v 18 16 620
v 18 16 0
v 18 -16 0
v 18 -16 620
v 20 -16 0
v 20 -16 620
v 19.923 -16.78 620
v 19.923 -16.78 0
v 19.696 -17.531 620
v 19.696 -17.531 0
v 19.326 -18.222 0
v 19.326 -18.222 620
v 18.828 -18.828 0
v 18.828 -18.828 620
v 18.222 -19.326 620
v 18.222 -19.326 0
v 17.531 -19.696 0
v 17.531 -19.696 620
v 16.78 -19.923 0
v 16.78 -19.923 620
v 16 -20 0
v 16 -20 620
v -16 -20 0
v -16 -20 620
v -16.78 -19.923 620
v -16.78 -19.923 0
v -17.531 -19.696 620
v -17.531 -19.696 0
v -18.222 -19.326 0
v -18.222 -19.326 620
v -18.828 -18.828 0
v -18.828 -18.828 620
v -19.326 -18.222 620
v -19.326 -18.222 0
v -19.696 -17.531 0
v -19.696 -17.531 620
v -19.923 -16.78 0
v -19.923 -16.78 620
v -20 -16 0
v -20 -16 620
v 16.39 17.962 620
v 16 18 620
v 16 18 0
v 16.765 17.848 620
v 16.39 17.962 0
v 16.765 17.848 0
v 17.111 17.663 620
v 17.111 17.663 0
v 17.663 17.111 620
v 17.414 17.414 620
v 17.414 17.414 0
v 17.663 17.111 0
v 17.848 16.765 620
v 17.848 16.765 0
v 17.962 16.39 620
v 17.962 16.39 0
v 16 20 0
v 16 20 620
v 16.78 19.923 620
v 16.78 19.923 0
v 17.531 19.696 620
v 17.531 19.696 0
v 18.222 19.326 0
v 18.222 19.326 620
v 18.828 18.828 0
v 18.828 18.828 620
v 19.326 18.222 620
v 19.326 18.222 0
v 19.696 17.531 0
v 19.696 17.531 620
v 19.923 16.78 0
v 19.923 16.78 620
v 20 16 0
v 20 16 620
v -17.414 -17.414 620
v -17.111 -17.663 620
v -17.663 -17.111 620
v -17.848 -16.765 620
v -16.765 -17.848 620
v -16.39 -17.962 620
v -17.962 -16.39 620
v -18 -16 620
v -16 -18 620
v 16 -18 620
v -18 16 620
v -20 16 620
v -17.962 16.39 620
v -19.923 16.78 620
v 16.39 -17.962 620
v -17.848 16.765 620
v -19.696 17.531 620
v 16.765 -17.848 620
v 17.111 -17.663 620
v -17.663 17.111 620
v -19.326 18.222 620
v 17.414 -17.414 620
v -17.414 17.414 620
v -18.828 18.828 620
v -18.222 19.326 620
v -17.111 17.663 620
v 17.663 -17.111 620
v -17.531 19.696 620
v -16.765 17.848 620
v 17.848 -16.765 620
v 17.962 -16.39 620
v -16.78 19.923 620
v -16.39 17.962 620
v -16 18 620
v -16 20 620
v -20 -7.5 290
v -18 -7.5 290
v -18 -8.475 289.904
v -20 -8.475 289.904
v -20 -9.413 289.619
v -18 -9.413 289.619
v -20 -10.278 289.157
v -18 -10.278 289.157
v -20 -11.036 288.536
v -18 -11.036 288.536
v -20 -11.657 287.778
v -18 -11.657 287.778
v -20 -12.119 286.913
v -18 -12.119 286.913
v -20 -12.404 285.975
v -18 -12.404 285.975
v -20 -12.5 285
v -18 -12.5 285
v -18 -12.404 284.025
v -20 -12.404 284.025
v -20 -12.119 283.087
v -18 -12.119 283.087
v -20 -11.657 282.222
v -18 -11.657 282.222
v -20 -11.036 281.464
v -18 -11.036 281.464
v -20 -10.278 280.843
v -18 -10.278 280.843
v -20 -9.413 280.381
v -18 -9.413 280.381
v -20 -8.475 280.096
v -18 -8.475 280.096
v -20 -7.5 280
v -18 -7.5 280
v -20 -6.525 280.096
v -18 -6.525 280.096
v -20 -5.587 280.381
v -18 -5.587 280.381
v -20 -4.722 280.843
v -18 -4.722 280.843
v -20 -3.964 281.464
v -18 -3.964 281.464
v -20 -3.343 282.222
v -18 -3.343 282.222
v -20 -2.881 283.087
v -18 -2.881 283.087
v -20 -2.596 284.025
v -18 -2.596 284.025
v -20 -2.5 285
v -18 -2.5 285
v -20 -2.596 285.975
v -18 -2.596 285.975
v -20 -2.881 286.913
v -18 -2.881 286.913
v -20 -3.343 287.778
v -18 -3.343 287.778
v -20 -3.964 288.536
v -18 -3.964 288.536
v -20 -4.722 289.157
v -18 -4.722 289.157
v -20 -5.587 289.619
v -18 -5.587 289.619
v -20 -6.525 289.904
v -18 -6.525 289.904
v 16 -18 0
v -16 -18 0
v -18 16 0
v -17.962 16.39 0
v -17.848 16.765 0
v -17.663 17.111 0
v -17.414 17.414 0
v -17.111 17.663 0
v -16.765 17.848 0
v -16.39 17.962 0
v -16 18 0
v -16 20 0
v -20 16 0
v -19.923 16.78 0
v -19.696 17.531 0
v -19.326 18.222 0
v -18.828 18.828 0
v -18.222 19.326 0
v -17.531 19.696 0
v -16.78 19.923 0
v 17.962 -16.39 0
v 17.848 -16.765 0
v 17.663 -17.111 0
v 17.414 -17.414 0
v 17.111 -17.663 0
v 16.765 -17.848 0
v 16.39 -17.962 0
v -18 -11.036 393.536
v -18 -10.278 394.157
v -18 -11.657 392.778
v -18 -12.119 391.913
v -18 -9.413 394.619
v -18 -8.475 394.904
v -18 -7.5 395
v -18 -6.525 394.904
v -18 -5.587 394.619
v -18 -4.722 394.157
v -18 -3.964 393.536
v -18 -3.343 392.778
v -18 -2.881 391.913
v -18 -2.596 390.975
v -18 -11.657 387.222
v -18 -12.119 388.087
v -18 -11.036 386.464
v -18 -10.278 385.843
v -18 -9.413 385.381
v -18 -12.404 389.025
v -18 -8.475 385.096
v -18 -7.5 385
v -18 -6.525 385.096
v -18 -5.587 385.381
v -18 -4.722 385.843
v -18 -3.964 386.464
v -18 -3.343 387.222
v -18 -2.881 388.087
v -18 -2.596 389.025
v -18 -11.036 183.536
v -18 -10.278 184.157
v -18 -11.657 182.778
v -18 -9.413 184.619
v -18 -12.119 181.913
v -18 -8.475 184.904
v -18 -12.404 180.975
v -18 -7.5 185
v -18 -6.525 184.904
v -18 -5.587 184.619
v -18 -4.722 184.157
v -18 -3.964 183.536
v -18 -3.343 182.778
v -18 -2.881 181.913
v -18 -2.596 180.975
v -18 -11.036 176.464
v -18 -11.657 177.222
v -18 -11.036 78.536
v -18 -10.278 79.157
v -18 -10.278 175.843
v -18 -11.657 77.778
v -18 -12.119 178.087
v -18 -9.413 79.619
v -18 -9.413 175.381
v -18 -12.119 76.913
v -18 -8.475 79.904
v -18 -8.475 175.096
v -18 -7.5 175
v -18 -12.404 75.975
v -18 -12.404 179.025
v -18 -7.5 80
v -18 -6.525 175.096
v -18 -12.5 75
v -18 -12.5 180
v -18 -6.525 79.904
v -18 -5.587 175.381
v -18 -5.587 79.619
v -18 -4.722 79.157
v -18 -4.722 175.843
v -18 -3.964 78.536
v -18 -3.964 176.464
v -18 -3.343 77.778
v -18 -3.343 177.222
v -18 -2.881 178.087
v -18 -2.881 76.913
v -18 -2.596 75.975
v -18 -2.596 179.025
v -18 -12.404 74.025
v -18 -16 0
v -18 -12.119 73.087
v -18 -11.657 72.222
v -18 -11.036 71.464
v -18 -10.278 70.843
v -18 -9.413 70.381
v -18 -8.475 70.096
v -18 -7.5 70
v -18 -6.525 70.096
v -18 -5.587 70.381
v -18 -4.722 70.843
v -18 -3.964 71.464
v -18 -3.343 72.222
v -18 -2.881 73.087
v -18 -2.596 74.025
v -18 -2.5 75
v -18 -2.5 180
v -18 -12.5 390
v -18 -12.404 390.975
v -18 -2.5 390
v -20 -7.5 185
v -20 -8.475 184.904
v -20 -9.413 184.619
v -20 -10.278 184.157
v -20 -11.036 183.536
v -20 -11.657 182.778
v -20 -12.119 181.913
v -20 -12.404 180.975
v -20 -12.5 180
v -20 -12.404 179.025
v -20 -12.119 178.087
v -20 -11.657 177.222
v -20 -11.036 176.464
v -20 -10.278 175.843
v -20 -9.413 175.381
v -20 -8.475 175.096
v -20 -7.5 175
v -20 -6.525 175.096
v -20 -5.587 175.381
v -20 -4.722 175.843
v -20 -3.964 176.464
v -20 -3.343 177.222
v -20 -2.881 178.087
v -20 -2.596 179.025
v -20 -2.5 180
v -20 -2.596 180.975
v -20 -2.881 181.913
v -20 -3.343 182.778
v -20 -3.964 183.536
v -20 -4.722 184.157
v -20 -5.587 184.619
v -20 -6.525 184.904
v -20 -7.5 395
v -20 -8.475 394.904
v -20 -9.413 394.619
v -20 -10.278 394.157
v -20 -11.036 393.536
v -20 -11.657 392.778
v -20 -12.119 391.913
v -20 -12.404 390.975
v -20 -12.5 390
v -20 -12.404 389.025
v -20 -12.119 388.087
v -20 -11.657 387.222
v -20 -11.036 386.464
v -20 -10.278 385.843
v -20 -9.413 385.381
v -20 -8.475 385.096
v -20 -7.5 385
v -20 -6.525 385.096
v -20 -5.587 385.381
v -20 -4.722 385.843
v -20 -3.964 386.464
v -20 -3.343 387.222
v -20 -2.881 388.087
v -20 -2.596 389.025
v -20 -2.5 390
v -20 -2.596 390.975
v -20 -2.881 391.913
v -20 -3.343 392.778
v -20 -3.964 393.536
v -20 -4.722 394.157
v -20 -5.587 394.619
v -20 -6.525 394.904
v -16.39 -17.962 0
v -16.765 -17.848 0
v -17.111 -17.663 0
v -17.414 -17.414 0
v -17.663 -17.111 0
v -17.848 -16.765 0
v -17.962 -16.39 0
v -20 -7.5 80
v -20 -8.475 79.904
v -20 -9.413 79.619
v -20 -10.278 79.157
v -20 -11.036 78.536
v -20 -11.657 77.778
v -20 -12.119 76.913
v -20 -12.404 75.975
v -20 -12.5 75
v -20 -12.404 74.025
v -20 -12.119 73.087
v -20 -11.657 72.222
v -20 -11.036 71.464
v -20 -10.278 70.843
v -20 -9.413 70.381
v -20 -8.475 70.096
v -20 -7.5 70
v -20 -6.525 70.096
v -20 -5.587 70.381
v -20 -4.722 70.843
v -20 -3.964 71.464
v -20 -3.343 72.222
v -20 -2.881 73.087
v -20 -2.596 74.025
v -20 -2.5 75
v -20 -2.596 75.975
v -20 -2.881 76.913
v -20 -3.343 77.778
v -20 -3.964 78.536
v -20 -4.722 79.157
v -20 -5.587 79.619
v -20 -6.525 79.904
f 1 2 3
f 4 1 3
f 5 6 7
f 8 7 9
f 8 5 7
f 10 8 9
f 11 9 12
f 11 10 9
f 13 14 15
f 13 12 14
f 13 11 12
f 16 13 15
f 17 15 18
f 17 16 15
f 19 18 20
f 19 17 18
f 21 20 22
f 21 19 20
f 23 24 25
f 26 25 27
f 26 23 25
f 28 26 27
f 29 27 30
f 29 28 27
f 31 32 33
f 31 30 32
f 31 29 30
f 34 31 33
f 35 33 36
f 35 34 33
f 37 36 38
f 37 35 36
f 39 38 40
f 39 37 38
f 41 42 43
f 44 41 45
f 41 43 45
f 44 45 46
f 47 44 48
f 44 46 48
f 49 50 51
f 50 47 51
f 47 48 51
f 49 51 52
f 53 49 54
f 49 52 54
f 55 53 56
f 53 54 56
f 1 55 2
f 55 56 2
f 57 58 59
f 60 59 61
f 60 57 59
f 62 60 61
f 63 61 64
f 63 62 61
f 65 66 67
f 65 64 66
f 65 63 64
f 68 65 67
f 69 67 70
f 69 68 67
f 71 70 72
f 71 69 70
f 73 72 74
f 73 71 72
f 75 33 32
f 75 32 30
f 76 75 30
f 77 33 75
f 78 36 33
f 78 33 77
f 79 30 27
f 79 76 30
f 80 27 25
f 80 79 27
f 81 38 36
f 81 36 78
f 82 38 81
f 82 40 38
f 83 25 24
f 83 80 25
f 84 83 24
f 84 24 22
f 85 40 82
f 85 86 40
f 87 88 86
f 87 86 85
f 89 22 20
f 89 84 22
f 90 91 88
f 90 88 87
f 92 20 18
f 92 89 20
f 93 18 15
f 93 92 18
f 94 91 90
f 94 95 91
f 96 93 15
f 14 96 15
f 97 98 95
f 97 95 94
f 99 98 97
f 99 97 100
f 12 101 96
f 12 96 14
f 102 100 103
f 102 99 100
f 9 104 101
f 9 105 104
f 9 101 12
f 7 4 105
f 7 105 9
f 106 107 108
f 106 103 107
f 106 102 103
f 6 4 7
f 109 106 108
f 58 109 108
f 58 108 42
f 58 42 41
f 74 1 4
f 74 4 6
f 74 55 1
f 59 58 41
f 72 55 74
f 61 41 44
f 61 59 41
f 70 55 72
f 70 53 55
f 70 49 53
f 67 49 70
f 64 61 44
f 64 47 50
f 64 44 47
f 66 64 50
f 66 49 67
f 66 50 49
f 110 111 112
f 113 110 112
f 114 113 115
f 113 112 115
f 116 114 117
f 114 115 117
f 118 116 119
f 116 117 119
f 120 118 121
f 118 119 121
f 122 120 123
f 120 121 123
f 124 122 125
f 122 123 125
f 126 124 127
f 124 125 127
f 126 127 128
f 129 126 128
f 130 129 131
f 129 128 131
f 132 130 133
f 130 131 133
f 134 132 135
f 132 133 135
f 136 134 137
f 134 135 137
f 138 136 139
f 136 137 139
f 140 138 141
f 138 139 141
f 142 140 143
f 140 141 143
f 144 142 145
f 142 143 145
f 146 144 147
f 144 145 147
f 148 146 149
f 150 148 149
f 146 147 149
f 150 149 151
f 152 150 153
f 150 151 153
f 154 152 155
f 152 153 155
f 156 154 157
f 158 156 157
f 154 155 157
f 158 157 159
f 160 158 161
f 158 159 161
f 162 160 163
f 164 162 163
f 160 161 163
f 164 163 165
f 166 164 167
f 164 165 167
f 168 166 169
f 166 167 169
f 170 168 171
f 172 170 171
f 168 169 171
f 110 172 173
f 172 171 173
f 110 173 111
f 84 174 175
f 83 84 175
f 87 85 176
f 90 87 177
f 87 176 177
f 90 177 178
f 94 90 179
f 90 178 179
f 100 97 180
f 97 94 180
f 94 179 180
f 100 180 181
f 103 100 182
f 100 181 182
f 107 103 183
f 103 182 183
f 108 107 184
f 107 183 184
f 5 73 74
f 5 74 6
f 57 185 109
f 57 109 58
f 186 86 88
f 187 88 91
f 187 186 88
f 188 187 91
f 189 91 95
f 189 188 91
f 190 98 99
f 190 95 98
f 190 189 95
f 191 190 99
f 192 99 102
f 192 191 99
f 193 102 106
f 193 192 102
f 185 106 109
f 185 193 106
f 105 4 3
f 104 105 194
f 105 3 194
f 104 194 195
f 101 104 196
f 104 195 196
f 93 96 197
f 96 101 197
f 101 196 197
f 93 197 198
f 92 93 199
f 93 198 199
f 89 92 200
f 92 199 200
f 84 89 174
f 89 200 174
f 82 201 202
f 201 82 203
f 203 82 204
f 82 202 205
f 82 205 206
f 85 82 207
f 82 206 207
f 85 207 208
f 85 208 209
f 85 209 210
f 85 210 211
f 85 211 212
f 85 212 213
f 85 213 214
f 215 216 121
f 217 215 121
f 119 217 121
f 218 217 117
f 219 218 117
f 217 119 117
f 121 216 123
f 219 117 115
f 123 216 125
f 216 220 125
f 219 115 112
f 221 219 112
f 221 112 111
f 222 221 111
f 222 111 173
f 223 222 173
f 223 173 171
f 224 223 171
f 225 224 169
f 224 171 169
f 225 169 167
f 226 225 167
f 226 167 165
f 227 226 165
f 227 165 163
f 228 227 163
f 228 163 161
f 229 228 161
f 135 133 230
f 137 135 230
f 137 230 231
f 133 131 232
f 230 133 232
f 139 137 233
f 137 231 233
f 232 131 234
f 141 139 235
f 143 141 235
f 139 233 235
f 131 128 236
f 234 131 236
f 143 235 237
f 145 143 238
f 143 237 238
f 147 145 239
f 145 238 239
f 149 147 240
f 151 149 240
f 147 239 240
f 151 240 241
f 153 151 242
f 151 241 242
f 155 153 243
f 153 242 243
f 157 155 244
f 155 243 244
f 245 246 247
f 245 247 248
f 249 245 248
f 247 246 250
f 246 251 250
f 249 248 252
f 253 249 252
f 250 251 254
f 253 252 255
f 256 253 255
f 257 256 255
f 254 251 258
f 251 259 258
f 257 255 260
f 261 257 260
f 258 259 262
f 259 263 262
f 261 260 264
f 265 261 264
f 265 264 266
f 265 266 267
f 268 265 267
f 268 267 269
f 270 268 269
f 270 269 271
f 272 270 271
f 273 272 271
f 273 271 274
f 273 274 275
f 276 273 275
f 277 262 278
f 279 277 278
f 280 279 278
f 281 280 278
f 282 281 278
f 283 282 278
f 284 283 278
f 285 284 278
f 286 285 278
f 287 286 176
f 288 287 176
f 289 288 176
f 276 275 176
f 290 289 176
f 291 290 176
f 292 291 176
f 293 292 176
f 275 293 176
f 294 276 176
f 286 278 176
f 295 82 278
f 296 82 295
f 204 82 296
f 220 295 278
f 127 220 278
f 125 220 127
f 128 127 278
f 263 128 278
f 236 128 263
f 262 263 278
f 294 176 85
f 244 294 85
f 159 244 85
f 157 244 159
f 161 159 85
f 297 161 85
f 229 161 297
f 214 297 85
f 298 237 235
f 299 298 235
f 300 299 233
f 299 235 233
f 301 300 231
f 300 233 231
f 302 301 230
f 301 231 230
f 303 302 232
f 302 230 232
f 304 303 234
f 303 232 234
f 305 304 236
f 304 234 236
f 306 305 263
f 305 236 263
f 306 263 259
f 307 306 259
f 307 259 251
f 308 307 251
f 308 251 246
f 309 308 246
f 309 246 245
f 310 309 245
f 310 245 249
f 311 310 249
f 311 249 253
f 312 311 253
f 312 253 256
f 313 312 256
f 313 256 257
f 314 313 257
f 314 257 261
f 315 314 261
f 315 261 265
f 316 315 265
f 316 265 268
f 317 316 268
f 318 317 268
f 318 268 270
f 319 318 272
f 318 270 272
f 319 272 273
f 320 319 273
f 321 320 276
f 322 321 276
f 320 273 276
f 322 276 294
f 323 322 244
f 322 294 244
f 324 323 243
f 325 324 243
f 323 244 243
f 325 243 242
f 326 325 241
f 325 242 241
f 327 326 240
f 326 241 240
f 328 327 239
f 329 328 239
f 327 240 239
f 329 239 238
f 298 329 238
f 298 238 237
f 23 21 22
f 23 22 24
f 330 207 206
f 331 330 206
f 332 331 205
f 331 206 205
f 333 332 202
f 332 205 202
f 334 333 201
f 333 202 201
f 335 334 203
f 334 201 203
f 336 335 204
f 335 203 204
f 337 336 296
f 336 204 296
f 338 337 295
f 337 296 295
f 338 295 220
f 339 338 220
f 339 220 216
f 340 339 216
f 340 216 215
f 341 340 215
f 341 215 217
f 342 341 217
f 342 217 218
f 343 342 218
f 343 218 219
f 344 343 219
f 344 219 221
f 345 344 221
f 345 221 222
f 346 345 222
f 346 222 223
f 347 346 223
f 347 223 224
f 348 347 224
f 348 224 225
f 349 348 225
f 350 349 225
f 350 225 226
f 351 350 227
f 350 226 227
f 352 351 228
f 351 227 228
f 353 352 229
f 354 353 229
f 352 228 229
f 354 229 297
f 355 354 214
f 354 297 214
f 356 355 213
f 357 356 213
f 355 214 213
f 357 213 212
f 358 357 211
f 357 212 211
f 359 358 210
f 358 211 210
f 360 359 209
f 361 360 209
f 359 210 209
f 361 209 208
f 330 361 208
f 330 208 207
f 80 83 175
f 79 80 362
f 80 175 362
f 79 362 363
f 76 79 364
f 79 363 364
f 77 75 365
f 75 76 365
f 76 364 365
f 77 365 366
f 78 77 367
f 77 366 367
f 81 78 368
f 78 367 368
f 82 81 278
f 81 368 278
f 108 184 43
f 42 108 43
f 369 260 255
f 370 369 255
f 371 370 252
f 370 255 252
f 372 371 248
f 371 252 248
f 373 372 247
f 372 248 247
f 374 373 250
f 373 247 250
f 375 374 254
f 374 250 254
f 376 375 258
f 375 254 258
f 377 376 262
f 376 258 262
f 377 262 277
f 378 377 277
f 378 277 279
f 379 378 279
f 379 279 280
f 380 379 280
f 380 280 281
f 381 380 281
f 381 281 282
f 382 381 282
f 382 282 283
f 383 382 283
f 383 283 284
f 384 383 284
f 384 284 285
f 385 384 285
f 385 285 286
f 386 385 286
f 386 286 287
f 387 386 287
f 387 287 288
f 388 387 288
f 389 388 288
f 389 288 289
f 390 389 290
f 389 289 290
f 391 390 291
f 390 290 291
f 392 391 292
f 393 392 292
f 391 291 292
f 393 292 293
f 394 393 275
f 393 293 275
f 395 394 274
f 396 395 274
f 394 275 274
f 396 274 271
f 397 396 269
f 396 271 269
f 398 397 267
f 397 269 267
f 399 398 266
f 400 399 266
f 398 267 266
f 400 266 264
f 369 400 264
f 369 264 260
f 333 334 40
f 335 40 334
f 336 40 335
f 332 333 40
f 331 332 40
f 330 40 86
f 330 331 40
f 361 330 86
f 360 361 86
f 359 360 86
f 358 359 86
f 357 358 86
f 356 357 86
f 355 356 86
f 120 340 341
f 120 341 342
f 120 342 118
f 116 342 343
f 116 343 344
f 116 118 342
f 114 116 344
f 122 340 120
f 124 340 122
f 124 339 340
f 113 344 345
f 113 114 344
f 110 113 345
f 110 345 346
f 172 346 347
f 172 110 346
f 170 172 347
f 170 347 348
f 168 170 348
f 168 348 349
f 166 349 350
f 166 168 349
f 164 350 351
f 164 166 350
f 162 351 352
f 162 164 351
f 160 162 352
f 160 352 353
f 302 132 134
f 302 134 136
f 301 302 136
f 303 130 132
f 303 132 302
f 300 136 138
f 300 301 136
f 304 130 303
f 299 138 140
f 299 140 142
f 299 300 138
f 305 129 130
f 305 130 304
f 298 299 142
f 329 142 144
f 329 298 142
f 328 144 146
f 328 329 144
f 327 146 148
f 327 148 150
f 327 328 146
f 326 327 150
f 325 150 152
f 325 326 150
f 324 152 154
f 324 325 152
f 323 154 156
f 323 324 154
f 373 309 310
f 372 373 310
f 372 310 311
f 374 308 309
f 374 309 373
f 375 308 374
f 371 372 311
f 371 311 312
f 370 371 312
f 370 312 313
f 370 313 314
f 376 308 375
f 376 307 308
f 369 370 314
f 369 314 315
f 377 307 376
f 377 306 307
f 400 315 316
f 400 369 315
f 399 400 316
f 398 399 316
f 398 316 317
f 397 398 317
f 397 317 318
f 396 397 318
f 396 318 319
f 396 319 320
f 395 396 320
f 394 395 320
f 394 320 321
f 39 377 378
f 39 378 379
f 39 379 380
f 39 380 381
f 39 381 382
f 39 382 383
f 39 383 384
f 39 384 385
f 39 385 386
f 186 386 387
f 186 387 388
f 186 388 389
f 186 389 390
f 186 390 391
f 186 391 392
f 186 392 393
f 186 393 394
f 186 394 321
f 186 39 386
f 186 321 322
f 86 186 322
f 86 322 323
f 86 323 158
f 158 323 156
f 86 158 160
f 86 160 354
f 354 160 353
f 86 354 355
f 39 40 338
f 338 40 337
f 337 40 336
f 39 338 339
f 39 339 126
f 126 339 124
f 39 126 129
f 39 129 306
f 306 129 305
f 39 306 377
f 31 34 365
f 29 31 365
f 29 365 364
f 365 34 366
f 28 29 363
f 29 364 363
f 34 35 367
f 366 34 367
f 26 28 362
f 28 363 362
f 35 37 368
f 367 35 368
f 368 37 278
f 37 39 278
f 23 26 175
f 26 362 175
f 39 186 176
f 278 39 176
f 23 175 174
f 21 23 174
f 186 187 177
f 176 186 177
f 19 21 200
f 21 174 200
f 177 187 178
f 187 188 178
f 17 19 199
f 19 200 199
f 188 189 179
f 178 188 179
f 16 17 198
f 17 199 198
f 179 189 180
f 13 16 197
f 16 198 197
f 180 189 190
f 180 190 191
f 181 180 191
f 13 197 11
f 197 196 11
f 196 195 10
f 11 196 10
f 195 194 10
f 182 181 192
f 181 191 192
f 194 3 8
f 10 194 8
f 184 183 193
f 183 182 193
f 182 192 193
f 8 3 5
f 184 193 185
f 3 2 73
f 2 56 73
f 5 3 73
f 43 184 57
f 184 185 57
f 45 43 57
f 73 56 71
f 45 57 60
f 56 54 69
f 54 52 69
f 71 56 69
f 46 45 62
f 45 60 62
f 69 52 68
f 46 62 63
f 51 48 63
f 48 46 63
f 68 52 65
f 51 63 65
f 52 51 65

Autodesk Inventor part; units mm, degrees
ref_plane "YZ Plane" through (0, 0, 0) normal (1, 0, 0) x (0, 1, 0)
ref_plane "Piano iniziale" through (0, 0, 0) normal (0, 0, 1) x (1, 0, 0)
ref_plane "Piano finale" through (0, 0, 620) normal (0, 0, 1) x (1, 0, 0)
sketch "Schizzo" plane through (0, 0, 0) normal (0, 0, 1) x (1, 0, 0)
  line L0 (-20, -16) -> (-20, 16)
  line L1 (-16, 20) -> (16, 20)
  line L2 (20, 16) -> (20, -16)
  line L3 (16, -20) -> (-16, -20)
  arc A0 (-20, -16) -> (-16, -20) centre (-16, -16) ccw
  arc A1 (20, 16) -> (16, 20) centre (16, 16) ccw
  arc A2 (-16, 20) -> (-20, 16) centre (-16, 16) ccw
  arc A3 (16, -20) -> (20, -16) centre (16, -16) ccw
  arc A4 (-16, 18) -> (-18, 16) centre (-16, 16) ccw
  line L4 (-16, 18) -> (16, 18)
  arc A5 (18, 16) -> (16, 18) centre (16, 16) ccw
  line L5 (18, 16) -> (18, -16)
  arc A6 (16, -18) -> (18, -16) centre (16, -16) ccw
  line L6 (16, -18) -> (-16, -18)
  arc A7 (-18, -16) -> (-16, -18) centre (-16, -16) ccw
  line L7 (-18, -16) -> (-18, 16)
  line L8 (0, 29.1598) -> (0, -29.1598) construction
  line L9 (-29.1598, 0) -> (29.1598, 0) construction
  dimension "d7" = 4
  dimension "d9" = 40
  dimension "d11" = 40
  dimension "d12" = 2
  dimension "d15" = 20
  dimension "d16" = 20
extrude "Corpo" add sketch "Schizzo" along normal up to surface (620 mm away) from surface at 0
sketch "Sketch3" plane through (0, 0, 0) normal (0, 0, 1) x (1, 0, 0)
  line L0 (0, 0) -> (10, 0)
ref_plane "Work Plane3" through (0, 0, 0) normal (0, -1, 0) x (1, 0, 0)
sketch "Sketch4" plane through (0, 0, 0) normal (0, -1, 0) x (1, 0, 0)
  line L0 (-2, 0) -> (12, 0)
  line L1 (-2, 620) -> (12, 620)
  dimension "d18" = 620
sketch "Schizzo5" plane through (-20, 16, 0) normal (-1, 0, 0) x (0, 0, 1)
  line L0 (0, -36) -> (620, -36) projected
  line L1 (0, -32) -> (0, 0) projected
  point P0 (0, -16)
  point P1 (75, -23.5)
  point P2 (285, -23.5)
  point P3 (390, -23.5)
  point P4 (180, -23.5)
  dimension "d22" = 105
  dimension "d30" = 12.5
  dimension "d31" = 75
  dimension "d32" = 105
  dimension "d33" = 105
hole "Foro1" at (-20, -7.5, 75) at (-20, -7.5, 285) at (-20, -7.5, 390) at (-20, -7.5, 180) direction (1, 0, 0) diameter 10 depth 5 tip angle 118
equation "\"d7\" = G_IR"
equation "\"d9\" = G_W"
equation "\"d11\" = G_H"
equation "\"d12\" = G_T"
equation "\"d15\" = 0.5 * d9"
equation "\"d16\" = 0.5 * d11"
equation "\"d3\" = G_L"
equation "\"G_W\" = 40"
equation "\"G_H\" = 40"
equation "\"G_T\" = 2"
equation "\"G_IR\" = 4"
equation "\"G_L\" = d18"
equation "\"G_OFFSET_START\" = 0"
equation "\"G_OFFSET_END\" = 0"
properties part number "ISO 10799-2 - 40x40x2 - 620" material "Acciaio, Dolce"
